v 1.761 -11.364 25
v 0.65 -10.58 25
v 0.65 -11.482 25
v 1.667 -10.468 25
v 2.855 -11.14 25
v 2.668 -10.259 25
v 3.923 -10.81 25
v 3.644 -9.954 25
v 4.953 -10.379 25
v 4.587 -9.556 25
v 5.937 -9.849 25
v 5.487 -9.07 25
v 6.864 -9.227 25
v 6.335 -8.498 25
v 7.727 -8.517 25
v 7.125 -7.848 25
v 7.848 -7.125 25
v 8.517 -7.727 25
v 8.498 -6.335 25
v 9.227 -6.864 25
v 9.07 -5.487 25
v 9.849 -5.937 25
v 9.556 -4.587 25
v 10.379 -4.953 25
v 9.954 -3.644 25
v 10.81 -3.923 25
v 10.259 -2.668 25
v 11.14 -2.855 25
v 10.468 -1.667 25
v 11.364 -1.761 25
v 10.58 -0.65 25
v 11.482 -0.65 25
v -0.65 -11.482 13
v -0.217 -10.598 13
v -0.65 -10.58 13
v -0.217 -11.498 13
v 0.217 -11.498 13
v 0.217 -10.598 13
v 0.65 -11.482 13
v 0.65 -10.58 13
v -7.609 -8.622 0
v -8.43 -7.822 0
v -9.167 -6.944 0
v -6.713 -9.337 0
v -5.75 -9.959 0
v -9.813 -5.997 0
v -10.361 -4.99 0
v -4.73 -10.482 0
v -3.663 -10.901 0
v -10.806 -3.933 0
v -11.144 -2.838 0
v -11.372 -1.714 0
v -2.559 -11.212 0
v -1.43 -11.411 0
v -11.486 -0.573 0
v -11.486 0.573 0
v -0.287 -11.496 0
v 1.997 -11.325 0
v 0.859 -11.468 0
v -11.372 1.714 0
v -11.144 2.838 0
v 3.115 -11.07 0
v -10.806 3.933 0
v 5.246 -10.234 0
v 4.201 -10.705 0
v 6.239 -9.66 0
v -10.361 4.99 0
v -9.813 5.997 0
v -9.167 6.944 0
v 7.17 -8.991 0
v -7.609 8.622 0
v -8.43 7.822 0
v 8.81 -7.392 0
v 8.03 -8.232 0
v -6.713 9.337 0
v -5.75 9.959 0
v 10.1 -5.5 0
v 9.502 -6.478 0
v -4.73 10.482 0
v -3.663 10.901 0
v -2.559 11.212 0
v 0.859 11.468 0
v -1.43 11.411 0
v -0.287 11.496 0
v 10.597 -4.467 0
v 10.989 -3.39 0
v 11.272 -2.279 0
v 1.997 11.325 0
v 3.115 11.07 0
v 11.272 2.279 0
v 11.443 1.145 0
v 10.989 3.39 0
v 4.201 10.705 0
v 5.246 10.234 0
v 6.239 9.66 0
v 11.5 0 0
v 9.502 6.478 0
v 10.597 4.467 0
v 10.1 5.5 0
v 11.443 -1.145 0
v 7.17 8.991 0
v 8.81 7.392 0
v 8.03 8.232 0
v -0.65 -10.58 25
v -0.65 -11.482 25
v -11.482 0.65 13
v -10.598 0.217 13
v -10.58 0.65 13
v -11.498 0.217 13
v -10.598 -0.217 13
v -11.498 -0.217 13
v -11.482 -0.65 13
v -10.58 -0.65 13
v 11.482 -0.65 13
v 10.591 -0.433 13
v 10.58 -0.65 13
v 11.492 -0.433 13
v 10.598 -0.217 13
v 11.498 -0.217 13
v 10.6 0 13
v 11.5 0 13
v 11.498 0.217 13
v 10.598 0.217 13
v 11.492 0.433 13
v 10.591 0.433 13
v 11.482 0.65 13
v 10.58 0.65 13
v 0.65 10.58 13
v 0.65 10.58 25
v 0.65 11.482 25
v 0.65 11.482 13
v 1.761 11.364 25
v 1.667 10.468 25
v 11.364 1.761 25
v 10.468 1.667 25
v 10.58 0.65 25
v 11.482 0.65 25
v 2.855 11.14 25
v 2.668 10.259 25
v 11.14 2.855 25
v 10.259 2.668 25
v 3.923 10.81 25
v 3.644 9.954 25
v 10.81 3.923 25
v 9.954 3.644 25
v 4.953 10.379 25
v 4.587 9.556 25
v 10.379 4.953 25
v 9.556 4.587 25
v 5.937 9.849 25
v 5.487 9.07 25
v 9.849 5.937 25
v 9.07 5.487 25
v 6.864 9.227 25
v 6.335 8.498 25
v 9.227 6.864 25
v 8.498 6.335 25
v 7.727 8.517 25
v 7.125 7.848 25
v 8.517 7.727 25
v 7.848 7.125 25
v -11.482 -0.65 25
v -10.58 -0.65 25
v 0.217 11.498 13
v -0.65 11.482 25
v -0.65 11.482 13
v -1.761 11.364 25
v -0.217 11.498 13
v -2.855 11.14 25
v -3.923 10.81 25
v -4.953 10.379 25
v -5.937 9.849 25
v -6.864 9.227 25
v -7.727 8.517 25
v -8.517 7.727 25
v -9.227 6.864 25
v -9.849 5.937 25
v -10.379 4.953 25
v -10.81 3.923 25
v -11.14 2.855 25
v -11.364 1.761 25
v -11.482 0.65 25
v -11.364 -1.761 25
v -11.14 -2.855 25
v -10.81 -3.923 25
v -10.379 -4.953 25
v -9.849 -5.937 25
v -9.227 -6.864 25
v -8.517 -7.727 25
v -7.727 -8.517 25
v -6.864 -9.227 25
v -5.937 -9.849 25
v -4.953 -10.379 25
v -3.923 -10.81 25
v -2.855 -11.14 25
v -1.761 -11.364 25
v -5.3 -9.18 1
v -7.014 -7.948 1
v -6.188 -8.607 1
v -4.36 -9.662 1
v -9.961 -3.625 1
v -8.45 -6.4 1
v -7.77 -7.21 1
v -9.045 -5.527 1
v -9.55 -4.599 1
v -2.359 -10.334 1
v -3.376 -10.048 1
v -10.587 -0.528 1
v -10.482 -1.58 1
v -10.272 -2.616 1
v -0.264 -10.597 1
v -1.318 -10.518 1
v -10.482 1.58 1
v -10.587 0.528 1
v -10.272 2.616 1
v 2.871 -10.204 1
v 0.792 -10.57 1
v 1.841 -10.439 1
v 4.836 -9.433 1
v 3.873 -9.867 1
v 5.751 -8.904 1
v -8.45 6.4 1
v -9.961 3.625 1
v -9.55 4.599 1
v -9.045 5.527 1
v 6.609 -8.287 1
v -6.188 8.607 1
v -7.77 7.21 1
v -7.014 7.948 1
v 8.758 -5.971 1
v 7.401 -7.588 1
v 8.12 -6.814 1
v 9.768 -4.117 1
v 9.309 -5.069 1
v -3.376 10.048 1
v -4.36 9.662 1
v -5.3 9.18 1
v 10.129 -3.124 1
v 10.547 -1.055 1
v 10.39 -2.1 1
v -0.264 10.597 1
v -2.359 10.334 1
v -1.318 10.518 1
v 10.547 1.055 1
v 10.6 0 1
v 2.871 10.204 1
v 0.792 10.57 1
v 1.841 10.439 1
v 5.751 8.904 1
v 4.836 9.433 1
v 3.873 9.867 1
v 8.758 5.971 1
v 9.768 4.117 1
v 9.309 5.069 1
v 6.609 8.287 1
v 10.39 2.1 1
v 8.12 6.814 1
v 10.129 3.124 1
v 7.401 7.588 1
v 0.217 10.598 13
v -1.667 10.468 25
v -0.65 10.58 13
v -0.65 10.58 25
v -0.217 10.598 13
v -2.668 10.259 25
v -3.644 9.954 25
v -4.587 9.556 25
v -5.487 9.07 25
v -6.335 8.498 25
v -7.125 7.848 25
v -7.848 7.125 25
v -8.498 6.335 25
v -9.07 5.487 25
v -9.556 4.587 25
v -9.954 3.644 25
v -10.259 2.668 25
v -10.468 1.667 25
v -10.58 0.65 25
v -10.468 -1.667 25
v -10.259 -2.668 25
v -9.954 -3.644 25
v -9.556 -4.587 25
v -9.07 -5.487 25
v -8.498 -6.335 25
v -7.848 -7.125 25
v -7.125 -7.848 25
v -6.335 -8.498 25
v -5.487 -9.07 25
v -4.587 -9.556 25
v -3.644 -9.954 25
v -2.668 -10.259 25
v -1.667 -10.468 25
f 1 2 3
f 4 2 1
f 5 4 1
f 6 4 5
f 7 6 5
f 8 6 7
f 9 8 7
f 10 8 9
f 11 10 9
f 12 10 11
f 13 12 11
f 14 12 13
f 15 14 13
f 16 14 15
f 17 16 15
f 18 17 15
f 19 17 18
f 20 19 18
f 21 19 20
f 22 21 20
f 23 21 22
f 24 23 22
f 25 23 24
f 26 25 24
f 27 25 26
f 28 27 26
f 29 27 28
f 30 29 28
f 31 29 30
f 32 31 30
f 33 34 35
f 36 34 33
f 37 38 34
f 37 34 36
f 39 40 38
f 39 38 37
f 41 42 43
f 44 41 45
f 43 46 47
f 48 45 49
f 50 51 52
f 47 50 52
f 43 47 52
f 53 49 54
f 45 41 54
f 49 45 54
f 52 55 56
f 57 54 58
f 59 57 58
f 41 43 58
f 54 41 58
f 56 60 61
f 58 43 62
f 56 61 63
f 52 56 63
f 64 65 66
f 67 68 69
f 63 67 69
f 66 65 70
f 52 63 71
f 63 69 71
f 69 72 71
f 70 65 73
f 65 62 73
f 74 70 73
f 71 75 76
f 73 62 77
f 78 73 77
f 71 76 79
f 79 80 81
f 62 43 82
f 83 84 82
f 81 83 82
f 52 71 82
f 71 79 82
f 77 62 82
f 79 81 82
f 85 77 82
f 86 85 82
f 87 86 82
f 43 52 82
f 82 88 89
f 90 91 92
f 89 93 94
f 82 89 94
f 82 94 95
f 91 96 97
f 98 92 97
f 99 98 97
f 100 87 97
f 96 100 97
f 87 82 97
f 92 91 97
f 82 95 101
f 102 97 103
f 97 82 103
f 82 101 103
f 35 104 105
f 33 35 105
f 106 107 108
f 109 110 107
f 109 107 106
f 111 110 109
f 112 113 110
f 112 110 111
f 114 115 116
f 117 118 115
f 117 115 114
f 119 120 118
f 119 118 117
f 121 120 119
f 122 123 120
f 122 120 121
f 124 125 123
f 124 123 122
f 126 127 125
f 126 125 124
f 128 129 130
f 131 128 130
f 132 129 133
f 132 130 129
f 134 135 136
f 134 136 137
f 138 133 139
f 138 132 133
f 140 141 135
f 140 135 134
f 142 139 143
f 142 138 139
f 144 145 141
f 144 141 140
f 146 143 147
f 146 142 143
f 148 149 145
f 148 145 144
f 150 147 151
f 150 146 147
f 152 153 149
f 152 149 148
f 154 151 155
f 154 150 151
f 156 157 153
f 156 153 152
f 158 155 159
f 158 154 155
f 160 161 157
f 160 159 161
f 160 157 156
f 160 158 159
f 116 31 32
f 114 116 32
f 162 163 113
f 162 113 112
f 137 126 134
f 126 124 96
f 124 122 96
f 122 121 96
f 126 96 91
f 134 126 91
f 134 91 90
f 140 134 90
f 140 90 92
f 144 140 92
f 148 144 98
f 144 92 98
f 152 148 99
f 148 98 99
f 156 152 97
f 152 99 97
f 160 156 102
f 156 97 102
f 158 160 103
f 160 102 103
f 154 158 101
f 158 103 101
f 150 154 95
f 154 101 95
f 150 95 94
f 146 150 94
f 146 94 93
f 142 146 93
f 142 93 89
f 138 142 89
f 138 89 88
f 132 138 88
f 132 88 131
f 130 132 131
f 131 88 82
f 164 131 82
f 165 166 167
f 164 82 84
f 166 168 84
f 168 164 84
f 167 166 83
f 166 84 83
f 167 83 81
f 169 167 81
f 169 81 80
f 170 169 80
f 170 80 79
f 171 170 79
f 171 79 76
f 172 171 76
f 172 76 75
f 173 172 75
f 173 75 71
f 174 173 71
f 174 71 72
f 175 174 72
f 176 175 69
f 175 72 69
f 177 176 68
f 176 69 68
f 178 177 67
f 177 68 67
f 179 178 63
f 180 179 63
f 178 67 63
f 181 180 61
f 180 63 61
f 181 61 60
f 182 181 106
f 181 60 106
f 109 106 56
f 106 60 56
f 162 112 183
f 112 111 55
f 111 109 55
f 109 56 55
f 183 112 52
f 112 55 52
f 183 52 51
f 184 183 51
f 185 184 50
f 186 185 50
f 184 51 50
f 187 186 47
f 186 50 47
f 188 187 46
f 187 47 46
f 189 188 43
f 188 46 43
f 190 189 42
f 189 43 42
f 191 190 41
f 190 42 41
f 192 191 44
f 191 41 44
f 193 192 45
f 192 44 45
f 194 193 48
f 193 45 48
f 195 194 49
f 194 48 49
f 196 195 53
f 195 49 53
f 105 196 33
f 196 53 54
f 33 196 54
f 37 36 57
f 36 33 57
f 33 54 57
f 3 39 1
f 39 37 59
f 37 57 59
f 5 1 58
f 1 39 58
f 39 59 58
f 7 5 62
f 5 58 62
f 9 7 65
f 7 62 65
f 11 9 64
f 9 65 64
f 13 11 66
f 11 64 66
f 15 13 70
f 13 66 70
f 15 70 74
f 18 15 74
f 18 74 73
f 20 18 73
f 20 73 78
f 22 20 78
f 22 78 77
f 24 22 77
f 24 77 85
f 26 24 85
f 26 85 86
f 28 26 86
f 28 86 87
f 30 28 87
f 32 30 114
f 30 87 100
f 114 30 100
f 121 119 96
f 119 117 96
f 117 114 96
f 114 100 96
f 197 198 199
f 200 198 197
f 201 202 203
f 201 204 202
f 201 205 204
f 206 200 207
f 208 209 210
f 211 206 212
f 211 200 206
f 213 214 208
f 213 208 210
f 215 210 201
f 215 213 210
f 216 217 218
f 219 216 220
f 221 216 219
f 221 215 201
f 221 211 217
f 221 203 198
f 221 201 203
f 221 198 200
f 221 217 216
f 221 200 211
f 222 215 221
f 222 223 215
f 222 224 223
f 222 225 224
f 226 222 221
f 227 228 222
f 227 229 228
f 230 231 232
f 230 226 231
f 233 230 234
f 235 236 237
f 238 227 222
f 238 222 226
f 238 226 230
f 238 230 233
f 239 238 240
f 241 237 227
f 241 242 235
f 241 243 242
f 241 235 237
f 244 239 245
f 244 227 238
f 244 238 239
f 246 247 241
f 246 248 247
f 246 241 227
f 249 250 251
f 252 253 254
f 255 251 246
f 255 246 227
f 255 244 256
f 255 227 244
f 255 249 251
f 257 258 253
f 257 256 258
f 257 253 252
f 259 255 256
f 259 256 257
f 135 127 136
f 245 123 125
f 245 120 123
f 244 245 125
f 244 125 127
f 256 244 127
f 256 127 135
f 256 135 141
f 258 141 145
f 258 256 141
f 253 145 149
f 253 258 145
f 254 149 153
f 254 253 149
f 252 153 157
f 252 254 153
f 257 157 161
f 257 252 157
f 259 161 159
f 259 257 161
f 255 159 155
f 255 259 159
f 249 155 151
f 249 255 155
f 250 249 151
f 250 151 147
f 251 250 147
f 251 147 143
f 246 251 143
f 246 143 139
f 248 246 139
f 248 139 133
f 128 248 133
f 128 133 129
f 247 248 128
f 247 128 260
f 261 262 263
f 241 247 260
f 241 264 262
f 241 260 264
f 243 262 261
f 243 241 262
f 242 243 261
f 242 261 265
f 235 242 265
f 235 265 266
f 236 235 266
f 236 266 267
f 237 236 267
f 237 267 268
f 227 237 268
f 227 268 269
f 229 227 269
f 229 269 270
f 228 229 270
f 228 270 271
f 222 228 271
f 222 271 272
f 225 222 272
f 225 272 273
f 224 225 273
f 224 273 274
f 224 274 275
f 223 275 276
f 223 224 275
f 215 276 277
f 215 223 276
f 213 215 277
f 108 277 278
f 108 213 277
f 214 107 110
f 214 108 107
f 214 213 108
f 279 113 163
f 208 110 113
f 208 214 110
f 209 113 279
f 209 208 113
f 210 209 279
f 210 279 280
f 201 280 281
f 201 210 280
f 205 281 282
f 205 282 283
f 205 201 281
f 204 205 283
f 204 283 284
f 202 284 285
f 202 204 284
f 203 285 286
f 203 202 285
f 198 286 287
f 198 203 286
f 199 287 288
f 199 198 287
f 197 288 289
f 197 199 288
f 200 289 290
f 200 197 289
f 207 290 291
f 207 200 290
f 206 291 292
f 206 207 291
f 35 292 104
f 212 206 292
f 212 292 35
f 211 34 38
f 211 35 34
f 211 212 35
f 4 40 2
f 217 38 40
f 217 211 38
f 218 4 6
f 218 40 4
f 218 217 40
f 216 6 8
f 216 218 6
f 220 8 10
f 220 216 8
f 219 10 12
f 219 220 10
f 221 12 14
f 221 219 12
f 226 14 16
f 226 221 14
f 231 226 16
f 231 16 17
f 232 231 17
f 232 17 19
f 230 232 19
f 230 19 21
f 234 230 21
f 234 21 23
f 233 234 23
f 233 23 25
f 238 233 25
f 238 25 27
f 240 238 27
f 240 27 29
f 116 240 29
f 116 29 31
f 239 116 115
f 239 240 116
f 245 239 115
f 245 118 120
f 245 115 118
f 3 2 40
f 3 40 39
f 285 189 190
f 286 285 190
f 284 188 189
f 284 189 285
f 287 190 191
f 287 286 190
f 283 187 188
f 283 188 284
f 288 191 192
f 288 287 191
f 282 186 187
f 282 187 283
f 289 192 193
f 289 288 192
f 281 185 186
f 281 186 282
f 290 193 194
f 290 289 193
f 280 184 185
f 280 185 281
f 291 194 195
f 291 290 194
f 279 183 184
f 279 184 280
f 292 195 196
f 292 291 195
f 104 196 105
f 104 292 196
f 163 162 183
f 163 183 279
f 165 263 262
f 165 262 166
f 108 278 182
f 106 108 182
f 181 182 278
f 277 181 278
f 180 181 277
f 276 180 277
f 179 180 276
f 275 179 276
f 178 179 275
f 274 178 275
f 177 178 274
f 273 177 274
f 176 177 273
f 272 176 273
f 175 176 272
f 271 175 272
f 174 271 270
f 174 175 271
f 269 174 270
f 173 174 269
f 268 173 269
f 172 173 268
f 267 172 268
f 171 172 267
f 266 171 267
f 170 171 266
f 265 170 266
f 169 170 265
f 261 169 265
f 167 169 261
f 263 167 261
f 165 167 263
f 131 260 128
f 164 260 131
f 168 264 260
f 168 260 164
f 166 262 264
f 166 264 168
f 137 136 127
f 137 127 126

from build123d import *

# Parameters (mm, degrees)
SKETCH_1_R               = 11.5
SKETCH_1_R_2             = 10.6
EXTRUDE_1_DEPTH          = 25
SKETCH_2_R               = 11.5
EXTRUDE_2_DEPTH          = 1
SKETCH_3_W               = 3
SKETCH_3_H               = 1.3
CUT_EXTRUDE_4_DEPTH      = 12
PATTERN_CIRCULAR_1_COUNT = 4


with BuildPart() as part:
    # ｽｹｯﾁ1 → ﾎﾞｽ - 押し出し1 (new body)
    with BuildSketch(Plane.XY):
        Circle(SKETCH_1_R)
        Circle(SKETCH_1_R_2, mode=Mode.SUBTRACT)
    extrude(amount=EXTRUDE_1_DEPTH)

    # ｽｹｯﾁ2 → ﾎﾞｽ - 押し出し2 (add)
    with BuildSketch(Plane.XY):
        Circle(SKETCH_2_R)
    extrude(amount=EXTRUDE_2_DEPTH)

    # ｽｹｯﾁ3 → ｶｯﾄ - 押し出し4 (cut)
    with BuildSketch(Plane.XY.offset(25)):
        with Locations((11.5, 0)):
            Rectangle(SKETCH_3_W, SKETCH_3_H)
    cut_extrude_4 = extrude(amount=-CUT_EXTRUDE_4_DEPTH, mode=Mode.SUBTRACT)

    # 円形ﾊﾟﾀｰﾝ1: ｶｯﾄ - 押し出し4 ×4 about axis
    pattern_circular_1_axis = Axis((0, 0, 0), (0, 0, 1))
    for i in range(1, PATTERN_CIRCULAR_1_COUNT):
        add(cut_extrude_4.rotate(pattern_circular_1_axis, i * 360 / PATTERN_CIRCULAR_1_COUNT), mode=Mode.SUBTRACT)


solid = part.part
